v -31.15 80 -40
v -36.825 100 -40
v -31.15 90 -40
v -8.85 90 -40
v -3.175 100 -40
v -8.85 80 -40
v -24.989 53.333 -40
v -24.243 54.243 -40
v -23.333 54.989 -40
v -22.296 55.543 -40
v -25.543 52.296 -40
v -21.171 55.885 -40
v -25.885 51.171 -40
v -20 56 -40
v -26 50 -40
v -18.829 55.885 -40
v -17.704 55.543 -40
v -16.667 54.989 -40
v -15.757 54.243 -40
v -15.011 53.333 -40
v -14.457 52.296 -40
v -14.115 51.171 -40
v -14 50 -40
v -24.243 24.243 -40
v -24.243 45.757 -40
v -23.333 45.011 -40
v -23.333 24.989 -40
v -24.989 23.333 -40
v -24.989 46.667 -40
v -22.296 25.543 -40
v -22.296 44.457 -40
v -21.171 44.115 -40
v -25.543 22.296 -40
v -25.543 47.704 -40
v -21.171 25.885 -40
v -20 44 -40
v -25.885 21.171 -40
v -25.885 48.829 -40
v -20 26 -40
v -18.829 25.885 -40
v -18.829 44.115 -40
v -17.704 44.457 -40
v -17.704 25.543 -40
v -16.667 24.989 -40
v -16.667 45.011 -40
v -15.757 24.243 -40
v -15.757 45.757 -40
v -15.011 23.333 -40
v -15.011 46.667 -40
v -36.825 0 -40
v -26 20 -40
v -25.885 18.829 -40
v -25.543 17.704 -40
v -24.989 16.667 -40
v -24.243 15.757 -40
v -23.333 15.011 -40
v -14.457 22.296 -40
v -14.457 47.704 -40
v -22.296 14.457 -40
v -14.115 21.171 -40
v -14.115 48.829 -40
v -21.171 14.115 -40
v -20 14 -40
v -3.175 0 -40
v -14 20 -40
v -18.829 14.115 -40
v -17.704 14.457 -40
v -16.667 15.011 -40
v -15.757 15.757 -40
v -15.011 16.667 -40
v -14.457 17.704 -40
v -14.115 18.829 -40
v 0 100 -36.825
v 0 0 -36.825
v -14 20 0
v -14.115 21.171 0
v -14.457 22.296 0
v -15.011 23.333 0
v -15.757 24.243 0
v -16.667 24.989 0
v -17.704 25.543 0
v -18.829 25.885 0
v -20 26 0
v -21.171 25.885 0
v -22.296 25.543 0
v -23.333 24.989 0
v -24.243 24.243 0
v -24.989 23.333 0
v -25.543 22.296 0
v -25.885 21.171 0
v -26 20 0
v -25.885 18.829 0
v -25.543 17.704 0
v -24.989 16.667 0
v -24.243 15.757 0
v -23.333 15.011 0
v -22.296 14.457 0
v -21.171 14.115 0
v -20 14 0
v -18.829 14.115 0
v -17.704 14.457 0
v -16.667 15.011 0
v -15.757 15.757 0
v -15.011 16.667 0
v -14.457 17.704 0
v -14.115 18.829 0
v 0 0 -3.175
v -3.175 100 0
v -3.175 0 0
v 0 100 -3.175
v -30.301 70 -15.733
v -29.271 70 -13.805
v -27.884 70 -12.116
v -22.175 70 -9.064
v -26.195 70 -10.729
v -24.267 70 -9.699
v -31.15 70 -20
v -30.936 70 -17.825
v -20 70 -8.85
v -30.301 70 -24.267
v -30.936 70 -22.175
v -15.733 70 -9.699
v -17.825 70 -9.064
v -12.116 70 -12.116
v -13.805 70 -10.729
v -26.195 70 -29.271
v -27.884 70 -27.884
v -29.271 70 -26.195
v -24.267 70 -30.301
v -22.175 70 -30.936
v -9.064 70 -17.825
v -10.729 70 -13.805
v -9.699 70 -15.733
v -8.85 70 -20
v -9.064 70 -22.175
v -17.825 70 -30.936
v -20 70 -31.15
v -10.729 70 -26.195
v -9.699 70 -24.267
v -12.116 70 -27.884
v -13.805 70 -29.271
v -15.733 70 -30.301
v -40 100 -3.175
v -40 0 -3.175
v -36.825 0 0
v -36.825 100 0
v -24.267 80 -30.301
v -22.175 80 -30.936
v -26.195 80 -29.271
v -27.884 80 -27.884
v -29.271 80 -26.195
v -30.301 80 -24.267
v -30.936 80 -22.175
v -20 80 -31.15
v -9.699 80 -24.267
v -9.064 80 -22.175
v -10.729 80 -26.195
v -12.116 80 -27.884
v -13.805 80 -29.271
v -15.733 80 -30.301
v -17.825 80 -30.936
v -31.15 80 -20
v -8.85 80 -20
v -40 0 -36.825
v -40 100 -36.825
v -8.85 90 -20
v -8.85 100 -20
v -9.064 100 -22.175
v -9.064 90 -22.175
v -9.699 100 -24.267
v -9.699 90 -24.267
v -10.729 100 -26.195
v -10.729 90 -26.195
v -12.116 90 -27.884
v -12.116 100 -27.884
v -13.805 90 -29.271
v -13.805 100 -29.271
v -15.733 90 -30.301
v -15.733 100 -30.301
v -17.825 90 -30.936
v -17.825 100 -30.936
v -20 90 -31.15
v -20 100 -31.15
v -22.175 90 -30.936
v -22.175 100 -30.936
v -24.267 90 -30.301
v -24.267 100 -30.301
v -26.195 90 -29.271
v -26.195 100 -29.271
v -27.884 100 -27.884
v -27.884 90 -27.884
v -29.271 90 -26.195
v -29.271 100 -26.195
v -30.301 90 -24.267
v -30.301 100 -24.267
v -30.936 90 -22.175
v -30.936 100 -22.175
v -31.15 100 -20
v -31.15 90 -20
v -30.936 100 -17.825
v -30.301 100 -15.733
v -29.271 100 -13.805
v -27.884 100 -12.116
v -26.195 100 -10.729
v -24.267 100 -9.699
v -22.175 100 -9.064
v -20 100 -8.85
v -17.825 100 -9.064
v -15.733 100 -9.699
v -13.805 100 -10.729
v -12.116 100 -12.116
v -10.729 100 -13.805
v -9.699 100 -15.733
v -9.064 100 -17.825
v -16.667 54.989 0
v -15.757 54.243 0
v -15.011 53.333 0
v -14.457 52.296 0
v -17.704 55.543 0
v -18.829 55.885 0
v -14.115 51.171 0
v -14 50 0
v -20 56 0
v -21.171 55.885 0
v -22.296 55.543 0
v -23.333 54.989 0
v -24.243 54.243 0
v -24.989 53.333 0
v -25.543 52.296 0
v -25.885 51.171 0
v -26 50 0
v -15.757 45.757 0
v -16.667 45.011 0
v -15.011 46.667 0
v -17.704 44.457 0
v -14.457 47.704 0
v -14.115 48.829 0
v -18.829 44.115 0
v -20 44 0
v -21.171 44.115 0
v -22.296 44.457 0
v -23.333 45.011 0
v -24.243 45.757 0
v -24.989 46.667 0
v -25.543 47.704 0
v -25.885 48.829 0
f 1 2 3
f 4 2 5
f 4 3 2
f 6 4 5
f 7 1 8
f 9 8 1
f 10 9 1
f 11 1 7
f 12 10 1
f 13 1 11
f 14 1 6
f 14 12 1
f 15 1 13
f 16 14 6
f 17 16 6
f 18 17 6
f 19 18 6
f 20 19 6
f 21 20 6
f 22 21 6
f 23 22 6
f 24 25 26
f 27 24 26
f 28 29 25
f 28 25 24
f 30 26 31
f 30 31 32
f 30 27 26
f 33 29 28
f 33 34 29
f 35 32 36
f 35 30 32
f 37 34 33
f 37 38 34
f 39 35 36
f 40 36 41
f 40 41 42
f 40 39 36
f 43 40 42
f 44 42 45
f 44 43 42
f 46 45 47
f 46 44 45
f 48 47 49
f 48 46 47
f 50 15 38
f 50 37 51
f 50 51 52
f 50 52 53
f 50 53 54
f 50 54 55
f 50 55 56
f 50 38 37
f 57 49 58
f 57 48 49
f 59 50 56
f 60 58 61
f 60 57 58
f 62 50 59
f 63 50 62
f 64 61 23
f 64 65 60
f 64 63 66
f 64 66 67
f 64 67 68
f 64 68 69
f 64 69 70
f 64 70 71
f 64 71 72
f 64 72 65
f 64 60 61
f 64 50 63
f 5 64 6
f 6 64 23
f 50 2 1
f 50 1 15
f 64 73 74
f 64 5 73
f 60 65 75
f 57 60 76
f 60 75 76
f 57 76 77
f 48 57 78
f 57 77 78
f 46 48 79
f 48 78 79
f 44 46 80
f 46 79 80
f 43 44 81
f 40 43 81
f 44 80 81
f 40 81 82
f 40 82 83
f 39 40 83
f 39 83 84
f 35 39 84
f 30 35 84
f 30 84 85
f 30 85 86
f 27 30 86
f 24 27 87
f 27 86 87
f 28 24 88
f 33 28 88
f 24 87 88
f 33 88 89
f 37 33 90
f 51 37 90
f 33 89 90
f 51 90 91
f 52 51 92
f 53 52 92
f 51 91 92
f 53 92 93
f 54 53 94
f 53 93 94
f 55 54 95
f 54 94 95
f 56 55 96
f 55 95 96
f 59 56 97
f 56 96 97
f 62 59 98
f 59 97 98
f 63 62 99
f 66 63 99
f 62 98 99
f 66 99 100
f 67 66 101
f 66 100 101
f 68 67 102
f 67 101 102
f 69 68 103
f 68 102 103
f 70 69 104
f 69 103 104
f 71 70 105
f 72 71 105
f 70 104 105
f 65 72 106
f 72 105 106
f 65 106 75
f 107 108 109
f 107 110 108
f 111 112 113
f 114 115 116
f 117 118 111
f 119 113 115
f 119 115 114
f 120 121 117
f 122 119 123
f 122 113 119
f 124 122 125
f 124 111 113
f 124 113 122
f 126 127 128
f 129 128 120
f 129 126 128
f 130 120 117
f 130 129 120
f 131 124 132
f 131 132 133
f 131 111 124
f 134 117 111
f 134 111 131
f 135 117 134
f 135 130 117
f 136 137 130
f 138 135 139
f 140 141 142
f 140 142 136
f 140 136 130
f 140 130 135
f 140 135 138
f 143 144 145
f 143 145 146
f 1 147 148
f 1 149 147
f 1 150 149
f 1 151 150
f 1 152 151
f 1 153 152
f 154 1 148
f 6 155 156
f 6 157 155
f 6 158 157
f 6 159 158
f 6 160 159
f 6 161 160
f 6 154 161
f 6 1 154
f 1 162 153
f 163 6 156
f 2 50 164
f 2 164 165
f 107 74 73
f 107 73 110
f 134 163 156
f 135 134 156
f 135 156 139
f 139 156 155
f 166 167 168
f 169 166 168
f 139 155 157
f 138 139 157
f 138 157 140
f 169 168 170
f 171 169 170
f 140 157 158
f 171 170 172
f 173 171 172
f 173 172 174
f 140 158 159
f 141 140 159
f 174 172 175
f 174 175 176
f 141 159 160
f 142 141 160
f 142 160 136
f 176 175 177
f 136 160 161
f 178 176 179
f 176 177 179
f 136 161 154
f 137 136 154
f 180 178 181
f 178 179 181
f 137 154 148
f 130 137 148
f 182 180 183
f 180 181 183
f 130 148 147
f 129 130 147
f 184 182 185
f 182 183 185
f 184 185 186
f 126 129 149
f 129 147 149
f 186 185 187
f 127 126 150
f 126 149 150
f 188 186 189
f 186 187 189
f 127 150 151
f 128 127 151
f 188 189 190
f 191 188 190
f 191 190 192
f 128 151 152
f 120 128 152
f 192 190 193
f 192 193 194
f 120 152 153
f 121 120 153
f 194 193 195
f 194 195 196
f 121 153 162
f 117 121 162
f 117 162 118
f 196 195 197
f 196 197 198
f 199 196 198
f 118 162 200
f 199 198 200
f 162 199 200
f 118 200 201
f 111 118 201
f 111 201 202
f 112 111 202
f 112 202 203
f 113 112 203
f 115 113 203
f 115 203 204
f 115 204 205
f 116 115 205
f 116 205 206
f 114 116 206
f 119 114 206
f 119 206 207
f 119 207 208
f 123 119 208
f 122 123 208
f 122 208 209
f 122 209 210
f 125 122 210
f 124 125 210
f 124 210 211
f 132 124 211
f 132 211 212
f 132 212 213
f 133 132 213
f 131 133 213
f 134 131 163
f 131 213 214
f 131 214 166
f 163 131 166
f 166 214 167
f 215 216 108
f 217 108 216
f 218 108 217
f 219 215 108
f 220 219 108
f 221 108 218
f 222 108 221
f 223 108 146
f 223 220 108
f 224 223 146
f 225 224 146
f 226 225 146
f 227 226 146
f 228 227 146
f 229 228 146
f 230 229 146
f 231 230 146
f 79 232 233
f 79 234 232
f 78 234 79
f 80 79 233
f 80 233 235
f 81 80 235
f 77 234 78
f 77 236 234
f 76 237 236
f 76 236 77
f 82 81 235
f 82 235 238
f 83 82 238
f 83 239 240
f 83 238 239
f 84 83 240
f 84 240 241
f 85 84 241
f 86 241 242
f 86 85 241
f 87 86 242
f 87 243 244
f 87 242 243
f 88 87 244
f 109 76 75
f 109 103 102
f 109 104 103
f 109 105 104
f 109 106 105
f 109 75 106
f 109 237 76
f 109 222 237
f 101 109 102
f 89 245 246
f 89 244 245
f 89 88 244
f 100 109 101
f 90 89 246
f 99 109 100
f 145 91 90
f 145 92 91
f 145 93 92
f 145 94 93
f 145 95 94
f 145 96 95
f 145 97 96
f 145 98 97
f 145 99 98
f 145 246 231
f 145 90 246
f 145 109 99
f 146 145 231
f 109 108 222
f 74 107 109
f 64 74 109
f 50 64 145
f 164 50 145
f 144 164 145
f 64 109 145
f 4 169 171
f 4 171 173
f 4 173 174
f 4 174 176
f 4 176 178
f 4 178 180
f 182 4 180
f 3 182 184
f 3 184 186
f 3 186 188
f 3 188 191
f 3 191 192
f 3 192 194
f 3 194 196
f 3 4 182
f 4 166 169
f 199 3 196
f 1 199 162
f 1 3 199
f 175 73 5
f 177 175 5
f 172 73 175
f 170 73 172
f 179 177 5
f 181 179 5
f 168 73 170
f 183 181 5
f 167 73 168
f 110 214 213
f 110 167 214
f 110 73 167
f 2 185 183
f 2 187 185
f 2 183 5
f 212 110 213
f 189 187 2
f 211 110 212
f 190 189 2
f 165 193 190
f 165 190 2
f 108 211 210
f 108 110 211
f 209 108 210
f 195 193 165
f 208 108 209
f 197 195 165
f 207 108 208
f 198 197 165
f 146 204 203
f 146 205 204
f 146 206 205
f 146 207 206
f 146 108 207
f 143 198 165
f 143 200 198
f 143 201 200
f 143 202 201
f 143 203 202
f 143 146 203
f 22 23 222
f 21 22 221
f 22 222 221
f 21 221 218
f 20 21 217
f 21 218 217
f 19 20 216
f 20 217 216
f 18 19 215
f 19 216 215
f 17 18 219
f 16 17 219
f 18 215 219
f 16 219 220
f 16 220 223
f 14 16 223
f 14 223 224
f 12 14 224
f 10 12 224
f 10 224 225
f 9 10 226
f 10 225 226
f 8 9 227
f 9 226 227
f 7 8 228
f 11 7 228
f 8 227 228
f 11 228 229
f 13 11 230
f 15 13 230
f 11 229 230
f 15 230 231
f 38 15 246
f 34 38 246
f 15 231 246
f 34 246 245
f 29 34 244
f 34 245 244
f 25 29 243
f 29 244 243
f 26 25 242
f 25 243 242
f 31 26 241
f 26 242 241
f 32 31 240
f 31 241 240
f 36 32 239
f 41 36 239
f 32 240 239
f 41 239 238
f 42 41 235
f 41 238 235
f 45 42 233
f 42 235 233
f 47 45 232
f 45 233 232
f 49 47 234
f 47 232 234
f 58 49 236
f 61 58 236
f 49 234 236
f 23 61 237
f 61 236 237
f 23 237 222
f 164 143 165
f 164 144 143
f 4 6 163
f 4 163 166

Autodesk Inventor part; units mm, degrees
ref_plane "YZ Plane" through (0, 0, 0) normal (1, 0, 0) x (0, 1, 0)
ref_plane "XZ Plane" through (0, 0, 0) normal (0, 1, 0) x (-1, 0, 0)
ref_plane "XY Plane" through (0, 0, 0) normal (0, 0, 1) x (1, 0, 0)
sketch "Sketch1" plane through (0, 0, 0) normal (0, 1, 0) x (-1, 0, 0)
  line L0 (0, 0) -> (40, 0)
  line L1 (40, 0) -> (40, -40)
  line L2 (40, -40) -> (0, -40)
  line L3 (0, -40) -> (0, 0)
  dimension "d0" = 40
  dimension "d1" = 40
extrude "Extrusion1" add sketch "Sketch1" along normal blind 100
sketch "Sketch2" plane through (-40, 0, 0) normal (0, 0, 1) x (1, 0, 0)
  circle A0 centre (20, 20) radius 6
  circle A1 centre (20, 50) radius 6
  line L0 (40, 0) -> (0, 0) projected
  line L1 (0, 0) -> (0, 100) projected
  dimension "d4" = 12
  dimension "d5" = 12
  dimension "d6" = 20
  dimension "d7" = 30
  dimension "d8" = 20
  dimension "d9" = 20
extrude "Extrusion2" cut sketch "Sketch2" against normal blind 40
sketch "Sketch3" plane through (0, 100, 0) normal (0, 1, 0) x (1, 0, 0)
  circle A0 centre (-20, 20) radius 11.15
  line L0 (-40, 40) -> (-40, 0) projected
  line L1 (-40, 0) -> (0, 0) projected
  dimension "d12" = 22.3
  dimension "d13" = 20
  dimension "d14" = 20
extrude "Extrusion3" cut sketch "Sketch3" against normal blind 30
sketch "Sketch4" plane through (0, 0, -40) normal (0, 0, -1) x (-1, 0, 0)
  line L0 (8.85, 90) -> (31.15, 90)
  line L1 (31.15, 90) -> (31.15, 80)
  line L2 (31.15, 80) -> (8.85, 80)
  line L3 (8.85, 80) -> (8.85, 90)
  line L4 (8.85, 90) -> (31.15, 80) construction
  line L5 (31.15, 90) -> (8.85, 80) construction
  line L6 (0, 0) -> (0, 100) projected
  line L7 (0, 100) -> (40, 100) projected
  point P0 (20, 85)
  dimension "d17" = 22.3
  dimension "d18" = 10
  dimension "d19" = 20
  dimension "d20" = 15
extrude "Extrusion4" cut sketch "Sketch4" against normal blind 20
chamfer "Chamfer1" distance 3.175 angle 45 4 edges at (-40, 50, 0) (-40, 50, -40) (0, 50, -40) (0, 50, 0)
properties part number "simplifiedY"
